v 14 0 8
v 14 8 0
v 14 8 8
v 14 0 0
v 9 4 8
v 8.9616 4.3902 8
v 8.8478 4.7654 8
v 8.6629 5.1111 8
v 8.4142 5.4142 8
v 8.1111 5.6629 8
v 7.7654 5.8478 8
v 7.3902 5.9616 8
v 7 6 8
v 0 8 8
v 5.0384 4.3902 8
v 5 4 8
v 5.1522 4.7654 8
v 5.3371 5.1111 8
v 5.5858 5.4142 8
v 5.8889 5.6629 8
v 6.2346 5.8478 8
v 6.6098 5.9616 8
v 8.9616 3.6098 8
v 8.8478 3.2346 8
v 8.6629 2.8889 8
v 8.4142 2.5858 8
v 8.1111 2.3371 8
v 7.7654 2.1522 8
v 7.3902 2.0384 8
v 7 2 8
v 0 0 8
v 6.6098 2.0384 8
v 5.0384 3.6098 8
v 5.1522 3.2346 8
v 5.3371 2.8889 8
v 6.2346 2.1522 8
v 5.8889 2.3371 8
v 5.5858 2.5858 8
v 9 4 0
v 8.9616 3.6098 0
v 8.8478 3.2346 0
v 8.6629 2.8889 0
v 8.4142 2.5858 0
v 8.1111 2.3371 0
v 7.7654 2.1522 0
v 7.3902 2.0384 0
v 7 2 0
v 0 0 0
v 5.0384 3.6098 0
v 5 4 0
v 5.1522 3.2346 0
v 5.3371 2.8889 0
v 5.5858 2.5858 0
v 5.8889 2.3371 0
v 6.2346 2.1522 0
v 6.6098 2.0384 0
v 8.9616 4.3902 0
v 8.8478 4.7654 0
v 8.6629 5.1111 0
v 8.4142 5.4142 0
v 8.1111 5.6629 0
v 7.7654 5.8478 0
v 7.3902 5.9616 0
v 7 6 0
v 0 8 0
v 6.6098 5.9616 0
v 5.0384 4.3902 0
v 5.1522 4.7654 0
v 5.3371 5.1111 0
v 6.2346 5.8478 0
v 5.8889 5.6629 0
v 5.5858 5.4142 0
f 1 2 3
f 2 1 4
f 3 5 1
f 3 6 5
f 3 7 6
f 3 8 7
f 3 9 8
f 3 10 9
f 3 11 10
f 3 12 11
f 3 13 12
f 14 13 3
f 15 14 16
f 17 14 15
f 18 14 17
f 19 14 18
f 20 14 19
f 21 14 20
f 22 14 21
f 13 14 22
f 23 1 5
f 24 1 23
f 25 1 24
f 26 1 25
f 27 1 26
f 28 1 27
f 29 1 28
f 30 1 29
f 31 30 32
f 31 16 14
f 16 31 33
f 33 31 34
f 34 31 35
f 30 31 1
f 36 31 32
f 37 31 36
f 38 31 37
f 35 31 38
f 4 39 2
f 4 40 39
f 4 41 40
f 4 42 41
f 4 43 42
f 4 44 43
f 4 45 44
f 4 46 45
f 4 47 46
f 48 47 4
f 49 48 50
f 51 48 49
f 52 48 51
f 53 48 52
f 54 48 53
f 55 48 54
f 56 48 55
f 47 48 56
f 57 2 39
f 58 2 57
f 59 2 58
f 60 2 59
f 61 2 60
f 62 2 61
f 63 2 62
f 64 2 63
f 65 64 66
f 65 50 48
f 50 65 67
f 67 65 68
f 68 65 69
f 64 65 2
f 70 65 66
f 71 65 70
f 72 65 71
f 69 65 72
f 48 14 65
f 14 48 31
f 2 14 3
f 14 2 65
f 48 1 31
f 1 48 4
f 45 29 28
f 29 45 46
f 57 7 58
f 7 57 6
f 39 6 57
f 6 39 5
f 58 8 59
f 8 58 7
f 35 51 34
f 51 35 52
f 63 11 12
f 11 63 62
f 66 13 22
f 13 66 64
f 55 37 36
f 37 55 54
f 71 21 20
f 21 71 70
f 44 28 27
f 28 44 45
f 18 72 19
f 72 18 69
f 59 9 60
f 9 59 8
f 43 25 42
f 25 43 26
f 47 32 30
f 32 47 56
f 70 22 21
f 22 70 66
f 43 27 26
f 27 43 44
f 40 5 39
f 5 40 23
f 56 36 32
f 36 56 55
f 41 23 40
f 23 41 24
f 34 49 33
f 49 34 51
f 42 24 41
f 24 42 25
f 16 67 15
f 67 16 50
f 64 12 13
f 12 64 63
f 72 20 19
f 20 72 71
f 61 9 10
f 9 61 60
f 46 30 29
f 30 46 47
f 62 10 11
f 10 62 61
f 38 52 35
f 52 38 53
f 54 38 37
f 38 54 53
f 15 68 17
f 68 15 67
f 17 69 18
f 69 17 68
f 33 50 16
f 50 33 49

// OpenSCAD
$fn = 32;

// ----------------------------------------------------------------------
// Micro pad: drilled pad, 5-20 mm class
// ----------------------------------------------------------------------

// --- parameters (mm) ---
pad_l = 14;               // pad length, X
pad_w = 8;                // pad width, Y
pad_t = 8;                // pad thickness, Z
hole_d = 4;               // through hole diameter

difference() {
  cube([pad_l, pad_w, pad_t]);
  translate([pad_l / 2, pad_w / 2, -1])
    cylinder(h = pad_t + 2, d = hole_d);
}
